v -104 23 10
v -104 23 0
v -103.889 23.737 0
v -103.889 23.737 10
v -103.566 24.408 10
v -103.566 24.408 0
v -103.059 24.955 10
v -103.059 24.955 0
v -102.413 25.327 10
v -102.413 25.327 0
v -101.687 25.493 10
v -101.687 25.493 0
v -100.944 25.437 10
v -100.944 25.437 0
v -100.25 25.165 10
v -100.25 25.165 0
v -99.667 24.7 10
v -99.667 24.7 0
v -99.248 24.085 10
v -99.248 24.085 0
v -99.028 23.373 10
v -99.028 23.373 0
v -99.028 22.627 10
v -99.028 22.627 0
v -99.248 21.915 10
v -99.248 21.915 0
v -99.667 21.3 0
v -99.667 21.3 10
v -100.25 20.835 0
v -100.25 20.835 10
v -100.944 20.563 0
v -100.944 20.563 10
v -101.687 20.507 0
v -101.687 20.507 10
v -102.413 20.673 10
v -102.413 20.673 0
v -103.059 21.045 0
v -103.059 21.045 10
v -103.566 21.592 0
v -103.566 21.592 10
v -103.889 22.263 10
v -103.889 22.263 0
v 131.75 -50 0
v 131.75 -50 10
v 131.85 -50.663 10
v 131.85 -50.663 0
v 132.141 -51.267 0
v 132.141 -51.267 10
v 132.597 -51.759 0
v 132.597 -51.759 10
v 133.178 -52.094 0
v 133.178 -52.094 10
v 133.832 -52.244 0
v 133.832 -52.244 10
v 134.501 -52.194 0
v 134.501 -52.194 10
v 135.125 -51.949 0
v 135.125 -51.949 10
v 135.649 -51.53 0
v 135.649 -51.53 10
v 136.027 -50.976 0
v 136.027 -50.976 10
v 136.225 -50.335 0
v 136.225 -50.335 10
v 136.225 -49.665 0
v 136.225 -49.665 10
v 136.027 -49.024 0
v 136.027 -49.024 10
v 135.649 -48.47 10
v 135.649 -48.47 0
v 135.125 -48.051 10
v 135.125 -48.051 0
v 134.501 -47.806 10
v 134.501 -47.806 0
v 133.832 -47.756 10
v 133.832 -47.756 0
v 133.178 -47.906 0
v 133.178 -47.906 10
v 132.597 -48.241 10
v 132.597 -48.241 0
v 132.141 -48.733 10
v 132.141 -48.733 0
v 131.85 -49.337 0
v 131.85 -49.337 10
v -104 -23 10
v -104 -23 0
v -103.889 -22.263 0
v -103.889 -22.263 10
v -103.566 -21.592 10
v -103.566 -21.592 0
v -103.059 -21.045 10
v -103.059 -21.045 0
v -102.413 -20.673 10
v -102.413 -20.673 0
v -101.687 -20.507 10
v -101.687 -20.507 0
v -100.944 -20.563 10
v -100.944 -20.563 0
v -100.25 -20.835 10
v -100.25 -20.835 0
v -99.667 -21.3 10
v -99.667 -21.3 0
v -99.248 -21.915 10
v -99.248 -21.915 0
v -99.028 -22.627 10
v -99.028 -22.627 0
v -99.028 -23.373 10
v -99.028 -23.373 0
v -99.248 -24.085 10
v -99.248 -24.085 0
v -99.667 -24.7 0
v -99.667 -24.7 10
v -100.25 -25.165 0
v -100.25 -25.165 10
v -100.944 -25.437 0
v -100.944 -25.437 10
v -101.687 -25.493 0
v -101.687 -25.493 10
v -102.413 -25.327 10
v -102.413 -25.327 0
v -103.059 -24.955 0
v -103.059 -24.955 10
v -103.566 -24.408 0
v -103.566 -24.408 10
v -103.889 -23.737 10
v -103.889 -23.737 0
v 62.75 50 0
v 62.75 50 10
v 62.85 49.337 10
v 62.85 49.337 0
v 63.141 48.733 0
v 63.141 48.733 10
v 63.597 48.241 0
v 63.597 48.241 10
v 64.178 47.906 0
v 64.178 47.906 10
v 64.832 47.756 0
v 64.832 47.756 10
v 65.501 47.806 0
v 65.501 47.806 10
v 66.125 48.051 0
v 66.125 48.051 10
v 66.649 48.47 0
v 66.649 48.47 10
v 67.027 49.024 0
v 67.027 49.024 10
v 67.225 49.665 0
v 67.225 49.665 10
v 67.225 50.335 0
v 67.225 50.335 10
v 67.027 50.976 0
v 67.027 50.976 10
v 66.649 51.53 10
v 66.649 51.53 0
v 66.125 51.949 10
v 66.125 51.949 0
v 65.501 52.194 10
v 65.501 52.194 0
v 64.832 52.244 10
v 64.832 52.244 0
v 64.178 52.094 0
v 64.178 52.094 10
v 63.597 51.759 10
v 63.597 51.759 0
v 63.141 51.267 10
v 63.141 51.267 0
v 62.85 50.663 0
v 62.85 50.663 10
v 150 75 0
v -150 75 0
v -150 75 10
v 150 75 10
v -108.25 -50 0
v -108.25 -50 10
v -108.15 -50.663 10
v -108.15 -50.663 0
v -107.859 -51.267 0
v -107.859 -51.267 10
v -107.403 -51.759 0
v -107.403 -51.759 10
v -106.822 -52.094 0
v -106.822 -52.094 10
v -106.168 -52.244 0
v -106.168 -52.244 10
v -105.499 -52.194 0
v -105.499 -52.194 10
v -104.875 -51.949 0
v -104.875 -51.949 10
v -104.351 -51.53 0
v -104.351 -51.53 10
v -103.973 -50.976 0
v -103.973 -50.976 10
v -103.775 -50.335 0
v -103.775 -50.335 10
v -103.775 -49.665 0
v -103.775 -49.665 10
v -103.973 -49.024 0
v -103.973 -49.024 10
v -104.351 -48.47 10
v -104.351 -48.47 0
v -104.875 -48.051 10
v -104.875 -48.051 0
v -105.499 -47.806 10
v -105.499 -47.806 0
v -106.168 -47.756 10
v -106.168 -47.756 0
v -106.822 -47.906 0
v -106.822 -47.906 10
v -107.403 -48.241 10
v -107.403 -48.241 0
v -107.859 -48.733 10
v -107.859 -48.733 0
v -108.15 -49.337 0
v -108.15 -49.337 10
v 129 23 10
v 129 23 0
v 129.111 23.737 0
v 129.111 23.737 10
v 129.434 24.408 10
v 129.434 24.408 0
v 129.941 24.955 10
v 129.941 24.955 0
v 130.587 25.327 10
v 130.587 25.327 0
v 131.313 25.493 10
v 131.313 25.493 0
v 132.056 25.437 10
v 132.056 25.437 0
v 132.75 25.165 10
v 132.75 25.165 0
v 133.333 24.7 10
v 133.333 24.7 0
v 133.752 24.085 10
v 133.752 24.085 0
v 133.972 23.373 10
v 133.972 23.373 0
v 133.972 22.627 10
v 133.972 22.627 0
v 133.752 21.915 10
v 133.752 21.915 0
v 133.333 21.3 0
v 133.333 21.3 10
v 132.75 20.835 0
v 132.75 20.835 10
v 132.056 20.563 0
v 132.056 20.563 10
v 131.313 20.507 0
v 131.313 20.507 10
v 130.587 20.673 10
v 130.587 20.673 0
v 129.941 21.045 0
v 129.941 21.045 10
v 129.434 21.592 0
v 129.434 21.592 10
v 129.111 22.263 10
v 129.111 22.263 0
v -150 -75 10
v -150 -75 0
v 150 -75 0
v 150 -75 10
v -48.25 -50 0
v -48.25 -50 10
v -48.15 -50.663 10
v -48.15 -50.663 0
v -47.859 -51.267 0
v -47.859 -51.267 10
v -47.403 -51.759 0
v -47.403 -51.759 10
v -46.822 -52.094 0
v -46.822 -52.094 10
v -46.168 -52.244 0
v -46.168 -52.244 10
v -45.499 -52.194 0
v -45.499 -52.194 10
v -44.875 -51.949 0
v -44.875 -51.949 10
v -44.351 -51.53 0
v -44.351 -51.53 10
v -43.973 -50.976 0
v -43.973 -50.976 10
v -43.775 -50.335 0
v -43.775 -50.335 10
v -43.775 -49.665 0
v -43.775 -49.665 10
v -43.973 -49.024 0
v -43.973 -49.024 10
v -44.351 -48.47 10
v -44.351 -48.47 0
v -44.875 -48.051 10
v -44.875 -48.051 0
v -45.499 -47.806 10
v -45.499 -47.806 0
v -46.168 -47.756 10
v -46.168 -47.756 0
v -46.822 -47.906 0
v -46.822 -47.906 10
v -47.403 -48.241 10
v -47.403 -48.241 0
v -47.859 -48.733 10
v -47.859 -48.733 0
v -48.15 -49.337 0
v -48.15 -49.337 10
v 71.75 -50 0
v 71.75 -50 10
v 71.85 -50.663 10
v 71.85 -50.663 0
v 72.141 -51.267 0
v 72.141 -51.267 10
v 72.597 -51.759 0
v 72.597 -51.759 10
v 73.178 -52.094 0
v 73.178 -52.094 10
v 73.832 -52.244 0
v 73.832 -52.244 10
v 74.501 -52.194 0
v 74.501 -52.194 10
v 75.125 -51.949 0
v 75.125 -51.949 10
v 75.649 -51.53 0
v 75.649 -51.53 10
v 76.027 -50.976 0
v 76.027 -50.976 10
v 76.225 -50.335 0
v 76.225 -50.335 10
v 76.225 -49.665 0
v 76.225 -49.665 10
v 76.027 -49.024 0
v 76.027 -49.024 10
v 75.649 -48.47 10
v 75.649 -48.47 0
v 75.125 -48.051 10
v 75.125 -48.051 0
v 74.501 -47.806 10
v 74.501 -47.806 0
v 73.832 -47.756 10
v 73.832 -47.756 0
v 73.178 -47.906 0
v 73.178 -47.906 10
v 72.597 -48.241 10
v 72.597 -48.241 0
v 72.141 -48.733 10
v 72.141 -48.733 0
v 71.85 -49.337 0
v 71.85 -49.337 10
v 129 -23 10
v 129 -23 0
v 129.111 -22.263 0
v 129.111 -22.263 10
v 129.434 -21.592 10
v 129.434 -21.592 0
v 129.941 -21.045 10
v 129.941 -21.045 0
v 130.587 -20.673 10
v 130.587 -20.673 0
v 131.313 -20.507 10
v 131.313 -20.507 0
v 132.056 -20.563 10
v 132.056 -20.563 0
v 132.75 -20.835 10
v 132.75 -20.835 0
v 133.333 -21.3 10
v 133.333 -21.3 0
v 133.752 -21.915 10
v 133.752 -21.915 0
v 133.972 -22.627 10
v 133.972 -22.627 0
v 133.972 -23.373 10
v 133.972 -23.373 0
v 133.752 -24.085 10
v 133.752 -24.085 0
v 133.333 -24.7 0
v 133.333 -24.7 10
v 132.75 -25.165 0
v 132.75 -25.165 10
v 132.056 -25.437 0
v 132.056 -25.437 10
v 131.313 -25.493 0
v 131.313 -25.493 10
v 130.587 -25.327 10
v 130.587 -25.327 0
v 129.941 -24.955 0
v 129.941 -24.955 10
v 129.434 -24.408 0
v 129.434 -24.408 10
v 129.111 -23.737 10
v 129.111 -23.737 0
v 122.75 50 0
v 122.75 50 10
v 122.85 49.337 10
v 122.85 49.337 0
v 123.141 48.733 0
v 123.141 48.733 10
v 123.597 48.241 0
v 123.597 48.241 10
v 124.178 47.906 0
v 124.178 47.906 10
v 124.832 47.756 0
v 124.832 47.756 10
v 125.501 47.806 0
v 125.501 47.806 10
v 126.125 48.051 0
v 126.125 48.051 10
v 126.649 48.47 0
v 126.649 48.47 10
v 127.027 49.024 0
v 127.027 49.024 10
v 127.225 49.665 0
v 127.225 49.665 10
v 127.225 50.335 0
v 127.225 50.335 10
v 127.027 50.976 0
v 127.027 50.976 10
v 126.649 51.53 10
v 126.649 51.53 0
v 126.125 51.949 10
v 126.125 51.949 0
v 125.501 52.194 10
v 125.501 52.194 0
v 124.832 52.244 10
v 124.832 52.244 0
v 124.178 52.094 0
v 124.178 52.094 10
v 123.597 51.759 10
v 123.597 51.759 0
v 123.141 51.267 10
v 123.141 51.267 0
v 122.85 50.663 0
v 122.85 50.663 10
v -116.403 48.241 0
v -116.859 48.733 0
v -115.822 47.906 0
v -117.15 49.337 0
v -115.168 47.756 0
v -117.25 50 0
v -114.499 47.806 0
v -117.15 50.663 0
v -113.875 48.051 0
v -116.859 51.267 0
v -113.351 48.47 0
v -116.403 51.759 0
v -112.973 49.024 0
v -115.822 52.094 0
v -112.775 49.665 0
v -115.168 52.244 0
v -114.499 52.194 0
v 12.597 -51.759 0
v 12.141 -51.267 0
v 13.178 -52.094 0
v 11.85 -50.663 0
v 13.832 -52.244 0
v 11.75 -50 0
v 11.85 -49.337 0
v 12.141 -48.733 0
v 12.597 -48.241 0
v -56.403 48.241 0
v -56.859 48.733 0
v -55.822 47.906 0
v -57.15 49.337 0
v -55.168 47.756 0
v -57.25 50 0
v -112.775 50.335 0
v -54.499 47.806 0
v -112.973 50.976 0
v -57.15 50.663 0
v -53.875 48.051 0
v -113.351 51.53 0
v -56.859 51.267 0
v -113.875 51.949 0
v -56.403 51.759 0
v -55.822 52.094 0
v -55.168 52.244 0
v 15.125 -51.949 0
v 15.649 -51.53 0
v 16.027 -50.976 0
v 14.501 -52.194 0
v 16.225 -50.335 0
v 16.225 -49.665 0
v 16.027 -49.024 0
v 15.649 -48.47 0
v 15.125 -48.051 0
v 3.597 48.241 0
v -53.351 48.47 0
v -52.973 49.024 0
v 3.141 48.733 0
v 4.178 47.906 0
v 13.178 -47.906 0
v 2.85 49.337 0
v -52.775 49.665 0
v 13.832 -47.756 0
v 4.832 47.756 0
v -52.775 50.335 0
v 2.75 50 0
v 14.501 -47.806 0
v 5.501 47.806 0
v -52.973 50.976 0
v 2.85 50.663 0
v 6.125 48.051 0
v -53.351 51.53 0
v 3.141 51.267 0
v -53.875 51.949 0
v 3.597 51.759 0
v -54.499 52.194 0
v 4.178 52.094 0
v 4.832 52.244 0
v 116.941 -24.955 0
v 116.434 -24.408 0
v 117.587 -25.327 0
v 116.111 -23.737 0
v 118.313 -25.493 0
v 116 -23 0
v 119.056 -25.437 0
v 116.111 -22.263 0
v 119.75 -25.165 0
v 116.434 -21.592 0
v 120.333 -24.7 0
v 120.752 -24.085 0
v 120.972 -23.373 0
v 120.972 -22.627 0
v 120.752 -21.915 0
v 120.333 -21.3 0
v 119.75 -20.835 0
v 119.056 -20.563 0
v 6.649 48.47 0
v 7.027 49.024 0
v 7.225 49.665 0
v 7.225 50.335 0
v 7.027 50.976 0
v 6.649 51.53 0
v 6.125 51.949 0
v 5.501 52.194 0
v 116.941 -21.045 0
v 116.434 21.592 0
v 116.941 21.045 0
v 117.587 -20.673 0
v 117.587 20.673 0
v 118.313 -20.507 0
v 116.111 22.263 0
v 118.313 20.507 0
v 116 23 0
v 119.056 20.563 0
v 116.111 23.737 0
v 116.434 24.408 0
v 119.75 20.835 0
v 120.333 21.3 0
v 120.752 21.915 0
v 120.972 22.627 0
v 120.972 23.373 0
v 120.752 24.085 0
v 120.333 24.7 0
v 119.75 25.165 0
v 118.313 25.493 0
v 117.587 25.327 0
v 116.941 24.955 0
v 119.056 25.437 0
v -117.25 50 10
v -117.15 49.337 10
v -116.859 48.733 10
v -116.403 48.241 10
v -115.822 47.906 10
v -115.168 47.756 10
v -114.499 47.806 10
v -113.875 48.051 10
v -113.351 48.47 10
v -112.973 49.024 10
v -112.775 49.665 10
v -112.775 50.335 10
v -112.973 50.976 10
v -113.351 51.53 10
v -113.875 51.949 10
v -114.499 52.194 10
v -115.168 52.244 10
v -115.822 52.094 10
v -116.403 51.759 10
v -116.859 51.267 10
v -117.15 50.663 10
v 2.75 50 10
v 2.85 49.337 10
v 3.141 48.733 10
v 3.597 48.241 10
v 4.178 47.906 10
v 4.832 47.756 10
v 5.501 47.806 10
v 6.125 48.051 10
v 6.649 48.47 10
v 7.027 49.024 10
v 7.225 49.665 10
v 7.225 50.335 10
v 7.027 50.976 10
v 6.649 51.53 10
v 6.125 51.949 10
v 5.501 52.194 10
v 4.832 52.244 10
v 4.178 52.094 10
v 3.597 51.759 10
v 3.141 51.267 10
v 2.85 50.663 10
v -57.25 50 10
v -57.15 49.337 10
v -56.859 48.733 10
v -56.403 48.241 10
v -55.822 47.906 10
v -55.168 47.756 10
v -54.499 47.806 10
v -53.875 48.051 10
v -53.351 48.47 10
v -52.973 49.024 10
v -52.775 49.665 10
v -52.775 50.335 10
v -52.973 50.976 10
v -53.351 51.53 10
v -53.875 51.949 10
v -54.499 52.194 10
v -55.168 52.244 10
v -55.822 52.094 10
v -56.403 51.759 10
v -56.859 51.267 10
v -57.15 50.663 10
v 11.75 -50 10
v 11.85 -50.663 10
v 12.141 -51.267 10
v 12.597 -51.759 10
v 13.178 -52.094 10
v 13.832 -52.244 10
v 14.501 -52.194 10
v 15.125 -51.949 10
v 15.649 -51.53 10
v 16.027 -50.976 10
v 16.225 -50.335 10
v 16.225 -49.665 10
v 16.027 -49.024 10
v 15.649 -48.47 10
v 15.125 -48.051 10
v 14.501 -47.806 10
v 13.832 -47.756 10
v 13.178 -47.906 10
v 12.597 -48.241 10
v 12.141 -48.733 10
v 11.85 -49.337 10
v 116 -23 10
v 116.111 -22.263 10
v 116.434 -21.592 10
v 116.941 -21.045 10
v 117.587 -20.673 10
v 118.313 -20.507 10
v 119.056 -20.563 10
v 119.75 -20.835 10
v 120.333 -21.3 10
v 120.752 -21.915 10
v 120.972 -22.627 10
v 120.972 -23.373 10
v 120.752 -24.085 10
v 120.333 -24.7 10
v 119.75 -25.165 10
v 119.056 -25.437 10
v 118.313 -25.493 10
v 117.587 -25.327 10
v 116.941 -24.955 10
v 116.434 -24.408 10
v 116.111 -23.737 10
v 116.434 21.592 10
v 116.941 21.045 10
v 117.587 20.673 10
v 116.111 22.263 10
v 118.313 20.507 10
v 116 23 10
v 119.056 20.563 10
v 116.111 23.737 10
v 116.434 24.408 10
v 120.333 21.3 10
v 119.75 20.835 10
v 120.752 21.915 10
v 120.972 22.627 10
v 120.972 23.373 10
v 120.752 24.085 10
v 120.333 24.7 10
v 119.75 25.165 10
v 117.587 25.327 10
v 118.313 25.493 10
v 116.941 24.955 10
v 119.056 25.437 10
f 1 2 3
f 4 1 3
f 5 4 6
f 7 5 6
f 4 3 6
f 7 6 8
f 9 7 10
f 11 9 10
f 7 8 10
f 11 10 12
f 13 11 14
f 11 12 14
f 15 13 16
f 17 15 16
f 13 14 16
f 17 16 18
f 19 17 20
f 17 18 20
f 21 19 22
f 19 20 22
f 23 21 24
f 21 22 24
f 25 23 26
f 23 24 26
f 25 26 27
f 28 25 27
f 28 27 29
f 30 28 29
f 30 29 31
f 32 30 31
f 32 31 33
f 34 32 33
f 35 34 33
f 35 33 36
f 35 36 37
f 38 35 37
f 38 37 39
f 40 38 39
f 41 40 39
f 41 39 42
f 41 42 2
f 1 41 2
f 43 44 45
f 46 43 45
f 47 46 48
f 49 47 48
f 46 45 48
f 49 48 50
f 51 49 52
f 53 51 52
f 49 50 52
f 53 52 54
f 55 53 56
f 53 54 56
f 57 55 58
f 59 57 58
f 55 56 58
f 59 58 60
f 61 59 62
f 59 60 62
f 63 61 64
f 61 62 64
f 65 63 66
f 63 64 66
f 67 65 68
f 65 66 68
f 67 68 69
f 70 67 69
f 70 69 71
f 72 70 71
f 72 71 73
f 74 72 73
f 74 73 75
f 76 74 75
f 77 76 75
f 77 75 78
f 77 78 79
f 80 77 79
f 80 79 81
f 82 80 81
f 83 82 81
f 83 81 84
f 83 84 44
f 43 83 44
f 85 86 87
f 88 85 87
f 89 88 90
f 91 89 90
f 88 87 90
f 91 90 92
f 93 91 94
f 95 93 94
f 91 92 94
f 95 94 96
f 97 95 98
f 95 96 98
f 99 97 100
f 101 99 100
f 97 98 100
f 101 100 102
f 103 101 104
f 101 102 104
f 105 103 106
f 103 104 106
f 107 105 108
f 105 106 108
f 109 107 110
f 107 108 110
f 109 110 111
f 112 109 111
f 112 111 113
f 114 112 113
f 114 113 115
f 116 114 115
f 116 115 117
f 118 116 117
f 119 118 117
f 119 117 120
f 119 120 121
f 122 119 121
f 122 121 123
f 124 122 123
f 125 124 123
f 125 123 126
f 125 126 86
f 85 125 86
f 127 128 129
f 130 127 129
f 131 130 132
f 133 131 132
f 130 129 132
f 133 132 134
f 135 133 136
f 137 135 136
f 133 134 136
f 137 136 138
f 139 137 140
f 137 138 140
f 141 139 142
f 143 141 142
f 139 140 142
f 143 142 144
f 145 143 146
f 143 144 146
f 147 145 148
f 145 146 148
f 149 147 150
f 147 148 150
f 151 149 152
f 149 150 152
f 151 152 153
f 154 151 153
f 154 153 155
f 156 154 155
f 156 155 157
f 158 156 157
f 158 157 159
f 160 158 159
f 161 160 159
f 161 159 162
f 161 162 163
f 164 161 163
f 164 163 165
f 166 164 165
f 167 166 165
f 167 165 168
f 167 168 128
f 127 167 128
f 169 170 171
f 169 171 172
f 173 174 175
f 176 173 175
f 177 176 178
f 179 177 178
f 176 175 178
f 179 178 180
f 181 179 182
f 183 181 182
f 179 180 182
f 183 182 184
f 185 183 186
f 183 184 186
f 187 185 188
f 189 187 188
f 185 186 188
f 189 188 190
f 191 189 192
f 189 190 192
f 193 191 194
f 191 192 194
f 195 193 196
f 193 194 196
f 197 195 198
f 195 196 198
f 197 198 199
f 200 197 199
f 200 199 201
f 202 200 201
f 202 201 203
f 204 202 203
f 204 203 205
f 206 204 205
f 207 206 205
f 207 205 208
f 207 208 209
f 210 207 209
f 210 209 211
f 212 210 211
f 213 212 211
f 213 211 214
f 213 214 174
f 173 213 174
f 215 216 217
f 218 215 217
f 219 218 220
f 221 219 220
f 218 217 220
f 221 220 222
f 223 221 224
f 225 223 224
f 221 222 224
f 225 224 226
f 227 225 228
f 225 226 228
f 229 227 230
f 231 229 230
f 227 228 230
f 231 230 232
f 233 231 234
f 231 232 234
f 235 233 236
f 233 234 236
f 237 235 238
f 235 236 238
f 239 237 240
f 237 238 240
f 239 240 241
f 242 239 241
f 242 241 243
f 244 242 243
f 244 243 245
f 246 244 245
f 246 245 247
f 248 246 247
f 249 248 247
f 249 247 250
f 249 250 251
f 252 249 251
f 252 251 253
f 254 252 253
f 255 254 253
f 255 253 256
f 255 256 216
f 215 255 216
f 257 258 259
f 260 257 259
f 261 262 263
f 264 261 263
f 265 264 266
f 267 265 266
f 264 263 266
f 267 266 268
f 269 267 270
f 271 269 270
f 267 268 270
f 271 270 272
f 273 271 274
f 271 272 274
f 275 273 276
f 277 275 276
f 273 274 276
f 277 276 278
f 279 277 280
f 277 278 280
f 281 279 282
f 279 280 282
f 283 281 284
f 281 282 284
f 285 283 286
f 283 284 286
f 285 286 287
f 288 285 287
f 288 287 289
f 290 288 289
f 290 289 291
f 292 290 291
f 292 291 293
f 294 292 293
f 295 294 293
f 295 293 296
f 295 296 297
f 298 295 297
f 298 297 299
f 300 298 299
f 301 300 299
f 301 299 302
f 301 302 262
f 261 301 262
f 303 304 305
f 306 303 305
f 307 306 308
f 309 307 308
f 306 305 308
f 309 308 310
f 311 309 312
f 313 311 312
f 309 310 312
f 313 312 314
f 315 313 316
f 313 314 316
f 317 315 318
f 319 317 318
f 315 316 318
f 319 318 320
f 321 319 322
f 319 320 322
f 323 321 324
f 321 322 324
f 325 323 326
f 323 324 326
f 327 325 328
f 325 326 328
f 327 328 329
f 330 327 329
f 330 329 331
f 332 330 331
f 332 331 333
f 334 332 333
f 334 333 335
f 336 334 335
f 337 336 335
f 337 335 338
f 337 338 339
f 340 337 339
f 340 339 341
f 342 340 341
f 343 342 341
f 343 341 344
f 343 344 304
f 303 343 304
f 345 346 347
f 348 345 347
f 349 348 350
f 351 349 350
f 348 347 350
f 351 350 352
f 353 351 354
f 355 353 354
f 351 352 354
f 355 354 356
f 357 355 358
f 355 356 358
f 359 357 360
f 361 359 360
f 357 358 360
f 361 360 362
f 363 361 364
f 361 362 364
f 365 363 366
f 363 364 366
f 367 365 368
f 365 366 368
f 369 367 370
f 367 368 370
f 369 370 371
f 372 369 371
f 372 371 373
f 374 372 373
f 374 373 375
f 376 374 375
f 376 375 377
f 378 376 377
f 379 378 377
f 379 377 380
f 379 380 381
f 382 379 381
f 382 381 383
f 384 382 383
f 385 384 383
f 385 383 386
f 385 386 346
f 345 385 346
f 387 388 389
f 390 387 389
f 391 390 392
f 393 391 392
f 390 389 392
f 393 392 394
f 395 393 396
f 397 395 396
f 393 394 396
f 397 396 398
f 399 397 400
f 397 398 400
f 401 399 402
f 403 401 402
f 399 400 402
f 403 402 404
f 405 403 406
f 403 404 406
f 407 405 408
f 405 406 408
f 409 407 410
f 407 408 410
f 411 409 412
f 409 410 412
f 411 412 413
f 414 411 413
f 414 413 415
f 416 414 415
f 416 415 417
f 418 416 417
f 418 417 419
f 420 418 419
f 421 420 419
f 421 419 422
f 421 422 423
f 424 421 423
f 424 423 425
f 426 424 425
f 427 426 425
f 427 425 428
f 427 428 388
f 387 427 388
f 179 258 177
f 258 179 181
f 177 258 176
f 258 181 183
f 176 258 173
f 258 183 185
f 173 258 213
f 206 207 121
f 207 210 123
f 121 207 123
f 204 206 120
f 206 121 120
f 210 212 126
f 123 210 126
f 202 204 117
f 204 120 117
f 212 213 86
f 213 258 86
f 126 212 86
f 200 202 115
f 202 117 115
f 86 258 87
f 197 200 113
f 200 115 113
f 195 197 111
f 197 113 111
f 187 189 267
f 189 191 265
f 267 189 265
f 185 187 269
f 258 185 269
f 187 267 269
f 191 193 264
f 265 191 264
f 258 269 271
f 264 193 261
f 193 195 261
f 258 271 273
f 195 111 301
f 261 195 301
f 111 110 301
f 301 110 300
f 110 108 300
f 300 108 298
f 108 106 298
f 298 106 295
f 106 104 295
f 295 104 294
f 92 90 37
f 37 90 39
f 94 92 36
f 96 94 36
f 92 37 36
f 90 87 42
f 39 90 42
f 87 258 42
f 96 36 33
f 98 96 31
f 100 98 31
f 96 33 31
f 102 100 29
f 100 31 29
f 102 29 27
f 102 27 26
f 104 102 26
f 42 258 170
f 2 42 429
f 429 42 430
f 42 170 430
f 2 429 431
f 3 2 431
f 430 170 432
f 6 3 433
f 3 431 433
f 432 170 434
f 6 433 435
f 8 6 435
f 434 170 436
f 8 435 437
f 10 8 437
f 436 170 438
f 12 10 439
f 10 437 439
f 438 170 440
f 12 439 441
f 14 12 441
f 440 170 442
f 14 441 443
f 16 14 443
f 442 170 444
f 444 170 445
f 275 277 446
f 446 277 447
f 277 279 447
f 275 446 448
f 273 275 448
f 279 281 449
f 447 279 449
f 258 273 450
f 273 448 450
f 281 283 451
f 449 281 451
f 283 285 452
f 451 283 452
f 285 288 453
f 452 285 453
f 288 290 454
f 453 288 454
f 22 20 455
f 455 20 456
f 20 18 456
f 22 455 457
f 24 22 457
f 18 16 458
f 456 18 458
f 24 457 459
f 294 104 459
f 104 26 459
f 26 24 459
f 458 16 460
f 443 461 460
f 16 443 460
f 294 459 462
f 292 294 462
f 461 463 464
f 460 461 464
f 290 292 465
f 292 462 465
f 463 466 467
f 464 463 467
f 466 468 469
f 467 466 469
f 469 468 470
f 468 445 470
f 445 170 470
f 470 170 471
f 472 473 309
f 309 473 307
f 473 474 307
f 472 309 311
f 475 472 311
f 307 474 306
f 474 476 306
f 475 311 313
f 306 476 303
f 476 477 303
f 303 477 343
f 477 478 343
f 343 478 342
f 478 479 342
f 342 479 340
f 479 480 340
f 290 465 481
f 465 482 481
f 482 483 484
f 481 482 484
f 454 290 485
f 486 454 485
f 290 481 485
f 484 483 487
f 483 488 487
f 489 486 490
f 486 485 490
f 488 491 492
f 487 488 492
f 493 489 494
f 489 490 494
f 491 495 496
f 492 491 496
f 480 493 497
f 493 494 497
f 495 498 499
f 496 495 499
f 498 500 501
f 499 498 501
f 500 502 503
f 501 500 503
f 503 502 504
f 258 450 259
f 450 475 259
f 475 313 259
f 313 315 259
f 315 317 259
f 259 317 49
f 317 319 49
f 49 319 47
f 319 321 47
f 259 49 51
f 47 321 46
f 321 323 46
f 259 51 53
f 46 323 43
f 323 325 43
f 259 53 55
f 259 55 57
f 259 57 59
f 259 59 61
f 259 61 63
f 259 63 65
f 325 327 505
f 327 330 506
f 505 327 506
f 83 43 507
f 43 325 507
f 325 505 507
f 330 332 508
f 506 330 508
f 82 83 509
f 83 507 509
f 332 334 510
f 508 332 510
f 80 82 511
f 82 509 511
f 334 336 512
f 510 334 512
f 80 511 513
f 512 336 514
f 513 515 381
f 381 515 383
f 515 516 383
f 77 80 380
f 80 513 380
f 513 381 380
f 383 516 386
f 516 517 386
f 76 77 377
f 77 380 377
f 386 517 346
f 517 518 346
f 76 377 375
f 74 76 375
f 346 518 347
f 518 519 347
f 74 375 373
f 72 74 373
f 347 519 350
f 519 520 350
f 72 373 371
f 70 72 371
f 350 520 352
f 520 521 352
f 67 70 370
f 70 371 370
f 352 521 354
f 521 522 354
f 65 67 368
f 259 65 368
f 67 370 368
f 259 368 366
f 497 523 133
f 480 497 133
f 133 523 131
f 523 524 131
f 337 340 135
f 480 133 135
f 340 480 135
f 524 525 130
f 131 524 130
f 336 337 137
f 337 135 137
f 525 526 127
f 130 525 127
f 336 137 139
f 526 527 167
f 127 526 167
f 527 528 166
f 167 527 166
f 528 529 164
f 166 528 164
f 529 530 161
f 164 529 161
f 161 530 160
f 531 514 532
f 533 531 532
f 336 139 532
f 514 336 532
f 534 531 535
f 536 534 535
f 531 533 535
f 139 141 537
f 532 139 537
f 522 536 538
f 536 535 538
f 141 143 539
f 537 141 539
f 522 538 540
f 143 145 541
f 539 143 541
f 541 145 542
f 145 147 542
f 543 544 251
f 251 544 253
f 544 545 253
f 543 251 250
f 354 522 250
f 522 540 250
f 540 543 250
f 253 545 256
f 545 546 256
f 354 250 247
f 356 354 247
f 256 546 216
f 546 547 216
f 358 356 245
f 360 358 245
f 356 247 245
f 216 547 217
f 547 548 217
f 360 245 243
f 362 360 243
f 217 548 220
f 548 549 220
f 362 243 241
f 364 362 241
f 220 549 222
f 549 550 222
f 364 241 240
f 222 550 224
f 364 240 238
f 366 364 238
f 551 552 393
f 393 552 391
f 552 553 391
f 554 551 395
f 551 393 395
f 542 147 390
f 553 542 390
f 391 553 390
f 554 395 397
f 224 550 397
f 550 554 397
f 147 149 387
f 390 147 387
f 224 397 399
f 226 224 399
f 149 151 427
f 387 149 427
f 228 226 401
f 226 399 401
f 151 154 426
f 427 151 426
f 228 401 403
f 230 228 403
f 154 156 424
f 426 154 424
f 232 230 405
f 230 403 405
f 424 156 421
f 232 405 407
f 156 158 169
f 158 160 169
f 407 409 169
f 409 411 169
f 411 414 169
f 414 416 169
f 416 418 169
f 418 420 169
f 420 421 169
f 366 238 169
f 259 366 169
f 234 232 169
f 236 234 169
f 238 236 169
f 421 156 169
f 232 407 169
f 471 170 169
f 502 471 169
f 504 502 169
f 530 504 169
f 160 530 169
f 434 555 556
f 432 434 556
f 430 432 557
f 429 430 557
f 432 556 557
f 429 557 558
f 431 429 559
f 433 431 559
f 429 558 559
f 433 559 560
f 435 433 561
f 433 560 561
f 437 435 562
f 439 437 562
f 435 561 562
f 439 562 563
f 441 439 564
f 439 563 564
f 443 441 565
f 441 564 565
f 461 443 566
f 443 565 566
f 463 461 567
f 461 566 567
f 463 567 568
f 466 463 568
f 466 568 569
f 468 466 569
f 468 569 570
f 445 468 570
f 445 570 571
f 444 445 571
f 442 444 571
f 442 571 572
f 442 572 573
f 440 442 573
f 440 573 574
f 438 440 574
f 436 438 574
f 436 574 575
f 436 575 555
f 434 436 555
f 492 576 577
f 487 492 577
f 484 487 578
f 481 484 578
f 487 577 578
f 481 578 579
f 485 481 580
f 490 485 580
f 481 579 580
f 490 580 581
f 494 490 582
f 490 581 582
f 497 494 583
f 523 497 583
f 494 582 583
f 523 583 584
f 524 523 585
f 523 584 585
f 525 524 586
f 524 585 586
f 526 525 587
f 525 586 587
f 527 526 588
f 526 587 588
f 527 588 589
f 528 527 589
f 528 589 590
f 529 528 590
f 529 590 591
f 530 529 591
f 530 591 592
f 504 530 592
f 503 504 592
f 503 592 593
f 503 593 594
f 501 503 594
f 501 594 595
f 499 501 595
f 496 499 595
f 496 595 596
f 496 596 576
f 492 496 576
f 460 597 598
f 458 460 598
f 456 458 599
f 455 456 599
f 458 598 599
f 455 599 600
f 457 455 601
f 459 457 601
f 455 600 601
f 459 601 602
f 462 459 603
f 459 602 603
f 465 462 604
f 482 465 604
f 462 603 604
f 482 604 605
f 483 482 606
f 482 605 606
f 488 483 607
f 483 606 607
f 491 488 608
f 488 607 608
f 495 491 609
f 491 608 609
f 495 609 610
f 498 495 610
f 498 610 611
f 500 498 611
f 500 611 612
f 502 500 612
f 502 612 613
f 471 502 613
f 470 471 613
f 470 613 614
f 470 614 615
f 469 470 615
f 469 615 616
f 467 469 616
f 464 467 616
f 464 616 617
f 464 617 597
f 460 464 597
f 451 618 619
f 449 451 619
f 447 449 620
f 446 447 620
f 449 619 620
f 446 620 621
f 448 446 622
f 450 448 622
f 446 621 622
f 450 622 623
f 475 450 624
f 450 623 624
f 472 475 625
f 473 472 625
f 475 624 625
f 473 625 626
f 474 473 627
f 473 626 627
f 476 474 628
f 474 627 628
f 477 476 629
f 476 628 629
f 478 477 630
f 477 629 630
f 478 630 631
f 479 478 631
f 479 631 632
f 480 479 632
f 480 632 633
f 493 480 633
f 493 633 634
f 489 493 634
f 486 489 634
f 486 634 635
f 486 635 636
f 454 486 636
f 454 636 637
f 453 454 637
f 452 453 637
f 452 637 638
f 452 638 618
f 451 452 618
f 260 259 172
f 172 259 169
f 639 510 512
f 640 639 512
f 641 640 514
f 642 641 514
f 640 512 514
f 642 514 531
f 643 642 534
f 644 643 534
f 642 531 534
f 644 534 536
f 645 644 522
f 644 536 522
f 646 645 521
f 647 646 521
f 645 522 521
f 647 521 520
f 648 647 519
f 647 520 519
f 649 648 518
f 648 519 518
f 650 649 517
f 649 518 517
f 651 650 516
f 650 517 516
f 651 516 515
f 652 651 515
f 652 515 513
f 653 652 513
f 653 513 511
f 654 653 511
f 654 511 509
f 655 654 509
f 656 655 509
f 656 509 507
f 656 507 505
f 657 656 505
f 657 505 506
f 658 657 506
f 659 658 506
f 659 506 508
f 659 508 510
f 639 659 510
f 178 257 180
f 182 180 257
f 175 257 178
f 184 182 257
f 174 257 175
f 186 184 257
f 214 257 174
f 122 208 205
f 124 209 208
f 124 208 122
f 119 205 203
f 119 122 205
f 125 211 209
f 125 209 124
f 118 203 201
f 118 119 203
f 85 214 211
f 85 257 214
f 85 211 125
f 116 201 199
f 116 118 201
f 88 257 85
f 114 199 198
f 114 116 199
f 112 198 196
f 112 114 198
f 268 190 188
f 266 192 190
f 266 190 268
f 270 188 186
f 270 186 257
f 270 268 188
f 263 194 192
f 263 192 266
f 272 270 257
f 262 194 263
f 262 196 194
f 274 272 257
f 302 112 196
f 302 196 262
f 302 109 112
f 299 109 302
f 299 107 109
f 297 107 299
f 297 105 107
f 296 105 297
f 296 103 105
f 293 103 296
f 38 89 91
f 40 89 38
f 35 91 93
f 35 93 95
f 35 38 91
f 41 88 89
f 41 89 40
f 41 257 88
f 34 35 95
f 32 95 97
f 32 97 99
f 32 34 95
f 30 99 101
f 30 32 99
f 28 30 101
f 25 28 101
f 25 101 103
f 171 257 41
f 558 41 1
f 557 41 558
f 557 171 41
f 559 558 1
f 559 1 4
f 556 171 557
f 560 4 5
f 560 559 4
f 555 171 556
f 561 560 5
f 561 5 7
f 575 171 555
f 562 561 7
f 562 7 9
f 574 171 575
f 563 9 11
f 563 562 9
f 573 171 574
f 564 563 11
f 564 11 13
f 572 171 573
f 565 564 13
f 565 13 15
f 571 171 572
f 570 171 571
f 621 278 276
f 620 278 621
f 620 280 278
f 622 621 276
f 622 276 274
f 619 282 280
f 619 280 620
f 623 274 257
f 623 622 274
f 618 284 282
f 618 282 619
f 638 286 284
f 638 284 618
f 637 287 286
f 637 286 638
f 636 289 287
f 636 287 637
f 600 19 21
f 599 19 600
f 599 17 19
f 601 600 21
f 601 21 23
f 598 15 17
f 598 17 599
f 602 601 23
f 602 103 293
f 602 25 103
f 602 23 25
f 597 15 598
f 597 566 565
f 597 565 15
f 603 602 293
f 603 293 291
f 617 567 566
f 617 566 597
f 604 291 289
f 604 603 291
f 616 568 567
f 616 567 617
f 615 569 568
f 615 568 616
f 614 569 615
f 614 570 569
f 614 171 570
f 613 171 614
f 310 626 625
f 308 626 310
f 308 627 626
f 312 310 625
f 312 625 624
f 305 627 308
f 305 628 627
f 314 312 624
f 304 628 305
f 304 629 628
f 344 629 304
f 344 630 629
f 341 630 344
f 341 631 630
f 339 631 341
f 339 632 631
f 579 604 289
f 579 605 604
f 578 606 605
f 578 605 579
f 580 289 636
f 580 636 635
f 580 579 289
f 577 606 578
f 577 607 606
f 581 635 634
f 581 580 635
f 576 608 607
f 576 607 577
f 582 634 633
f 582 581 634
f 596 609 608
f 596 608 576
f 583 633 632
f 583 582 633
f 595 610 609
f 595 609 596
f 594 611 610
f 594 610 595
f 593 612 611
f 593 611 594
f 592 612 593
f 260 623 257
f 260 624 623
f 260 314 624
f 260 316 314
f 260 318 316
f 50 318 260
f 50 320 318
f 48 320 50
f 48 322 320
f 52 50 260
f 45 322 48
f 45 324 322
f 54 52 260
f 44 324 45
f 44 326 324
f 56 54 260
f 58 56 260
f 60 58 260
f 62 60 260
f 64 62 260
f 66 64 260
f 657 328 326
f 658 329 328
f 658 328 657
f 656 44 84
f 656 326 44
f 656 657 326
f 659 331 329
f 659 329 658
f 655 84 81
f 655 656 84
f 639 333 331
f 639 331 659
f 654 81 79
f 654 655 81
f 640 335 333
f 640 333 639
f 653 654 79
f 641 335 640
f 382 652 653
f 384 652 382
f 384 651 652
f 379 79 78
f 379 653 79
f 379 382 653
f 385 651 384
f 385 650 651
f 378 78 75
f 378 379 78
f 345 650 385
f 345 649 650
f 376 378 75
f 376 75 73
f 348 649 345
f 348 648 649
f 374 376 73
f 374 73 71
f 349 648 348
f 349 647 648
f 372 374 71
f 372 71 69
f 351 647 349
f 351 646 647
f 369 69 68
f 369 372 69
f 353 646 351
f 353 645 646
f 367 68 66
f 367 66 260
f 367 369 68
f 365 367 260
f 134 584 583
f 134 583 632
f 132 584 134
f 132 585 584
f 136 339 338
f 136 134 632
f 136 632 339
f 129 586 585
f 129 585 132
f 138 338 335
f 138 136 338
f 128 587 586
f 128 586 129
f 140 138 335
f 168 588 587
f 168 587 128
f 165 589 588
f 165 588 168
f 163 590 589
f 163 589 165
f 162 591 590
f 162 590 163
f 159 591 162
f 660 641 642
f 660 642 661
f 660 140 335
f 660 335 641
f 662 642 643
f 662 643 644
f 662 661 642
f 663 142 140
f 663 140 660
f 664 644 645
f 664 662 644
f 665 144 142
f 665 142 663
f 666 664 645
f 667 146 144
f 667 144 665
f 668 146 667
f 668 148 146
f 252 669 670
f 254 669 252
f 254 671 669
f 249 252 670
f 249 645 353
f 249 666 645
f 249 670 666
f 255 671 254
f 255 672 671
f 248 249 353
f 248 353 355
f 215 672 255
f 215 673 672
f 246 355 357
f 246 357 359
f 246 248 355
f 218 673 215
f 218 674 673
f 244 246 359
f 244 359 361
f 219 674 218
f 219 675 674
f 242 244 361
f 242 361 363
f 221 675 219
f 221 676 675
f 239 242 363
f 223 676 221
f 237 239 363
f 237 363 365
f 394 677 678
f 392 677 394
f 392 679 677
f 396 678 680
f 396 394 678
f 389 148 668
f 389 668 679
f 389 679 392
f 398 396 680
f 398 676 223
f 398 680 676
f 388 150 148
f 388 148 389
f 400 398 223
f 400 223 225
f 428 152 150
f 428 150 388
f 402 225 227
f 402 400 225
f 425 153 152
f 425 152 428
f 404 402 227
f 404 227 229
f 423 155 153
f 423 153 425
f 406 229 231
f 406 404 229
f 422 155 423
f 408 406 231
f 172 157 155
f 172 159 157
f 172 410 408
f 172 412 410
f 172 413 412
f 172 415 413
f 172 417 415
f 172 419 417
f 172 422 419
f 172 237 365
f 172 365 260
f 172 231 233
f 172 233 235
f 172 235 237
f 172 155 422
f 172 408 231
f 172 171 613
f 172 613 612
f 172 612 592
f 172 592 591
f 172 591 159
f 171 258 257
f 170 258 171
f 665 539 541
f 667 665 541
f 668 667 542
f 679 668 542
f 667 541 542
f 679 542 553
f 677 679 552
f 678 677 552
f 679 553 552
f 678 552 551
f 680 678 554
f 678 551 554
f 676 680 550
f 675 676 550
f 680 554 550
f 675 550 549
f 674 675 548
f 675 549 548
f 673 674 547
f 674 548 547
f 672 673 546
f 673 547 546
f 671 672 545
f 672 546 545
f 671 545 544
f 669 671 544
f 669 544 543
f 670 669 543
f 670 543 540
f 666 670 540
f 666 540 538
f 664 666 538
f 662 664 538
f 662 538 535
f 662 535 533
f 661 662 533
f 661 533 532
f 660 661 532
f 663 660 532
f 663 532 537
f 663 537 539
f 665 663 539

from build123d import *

# Parameters (mm, degrees)
F0_W     = 300
F0_H     = 150
F1_DEPTH = 10
F2_D     = 4.5
F4_D     = 5


# Not quite as in the source:
# - a feature names something its author has since deleted; it is built from what else it names


with BuildPart() as f1:
    # F0 (on Top) → F1 (new body)
    with BuildSketch(Plane.XY):
        Rectangle(F0_W, F0_H)
    extrude(amount=F1_DEPTH)

    # F2 (through all)
    with Locations(Plane(origin=(0, 0, 0), x_dir=(1, 0, 0), z_dir=(0, 0, -1))):
        with Locations((125, -50), (65, -50), (-55, -50), (-115, -50), (5, -50), (134, 50), (74, 50), (14, 50), (-46, 50), (-106, 50)):
            Hole(F2_D / 2)

    # F4 (through all)
    with Locations(Plane.XY.offset(10)):
        with Locations((118.5, 23), (131.5, 23), (131.5, -23), (118.5, -23), (-101.5, 23), (-101.5, -23)):
            Hole(F4_D / 2)


solid = f1.part
